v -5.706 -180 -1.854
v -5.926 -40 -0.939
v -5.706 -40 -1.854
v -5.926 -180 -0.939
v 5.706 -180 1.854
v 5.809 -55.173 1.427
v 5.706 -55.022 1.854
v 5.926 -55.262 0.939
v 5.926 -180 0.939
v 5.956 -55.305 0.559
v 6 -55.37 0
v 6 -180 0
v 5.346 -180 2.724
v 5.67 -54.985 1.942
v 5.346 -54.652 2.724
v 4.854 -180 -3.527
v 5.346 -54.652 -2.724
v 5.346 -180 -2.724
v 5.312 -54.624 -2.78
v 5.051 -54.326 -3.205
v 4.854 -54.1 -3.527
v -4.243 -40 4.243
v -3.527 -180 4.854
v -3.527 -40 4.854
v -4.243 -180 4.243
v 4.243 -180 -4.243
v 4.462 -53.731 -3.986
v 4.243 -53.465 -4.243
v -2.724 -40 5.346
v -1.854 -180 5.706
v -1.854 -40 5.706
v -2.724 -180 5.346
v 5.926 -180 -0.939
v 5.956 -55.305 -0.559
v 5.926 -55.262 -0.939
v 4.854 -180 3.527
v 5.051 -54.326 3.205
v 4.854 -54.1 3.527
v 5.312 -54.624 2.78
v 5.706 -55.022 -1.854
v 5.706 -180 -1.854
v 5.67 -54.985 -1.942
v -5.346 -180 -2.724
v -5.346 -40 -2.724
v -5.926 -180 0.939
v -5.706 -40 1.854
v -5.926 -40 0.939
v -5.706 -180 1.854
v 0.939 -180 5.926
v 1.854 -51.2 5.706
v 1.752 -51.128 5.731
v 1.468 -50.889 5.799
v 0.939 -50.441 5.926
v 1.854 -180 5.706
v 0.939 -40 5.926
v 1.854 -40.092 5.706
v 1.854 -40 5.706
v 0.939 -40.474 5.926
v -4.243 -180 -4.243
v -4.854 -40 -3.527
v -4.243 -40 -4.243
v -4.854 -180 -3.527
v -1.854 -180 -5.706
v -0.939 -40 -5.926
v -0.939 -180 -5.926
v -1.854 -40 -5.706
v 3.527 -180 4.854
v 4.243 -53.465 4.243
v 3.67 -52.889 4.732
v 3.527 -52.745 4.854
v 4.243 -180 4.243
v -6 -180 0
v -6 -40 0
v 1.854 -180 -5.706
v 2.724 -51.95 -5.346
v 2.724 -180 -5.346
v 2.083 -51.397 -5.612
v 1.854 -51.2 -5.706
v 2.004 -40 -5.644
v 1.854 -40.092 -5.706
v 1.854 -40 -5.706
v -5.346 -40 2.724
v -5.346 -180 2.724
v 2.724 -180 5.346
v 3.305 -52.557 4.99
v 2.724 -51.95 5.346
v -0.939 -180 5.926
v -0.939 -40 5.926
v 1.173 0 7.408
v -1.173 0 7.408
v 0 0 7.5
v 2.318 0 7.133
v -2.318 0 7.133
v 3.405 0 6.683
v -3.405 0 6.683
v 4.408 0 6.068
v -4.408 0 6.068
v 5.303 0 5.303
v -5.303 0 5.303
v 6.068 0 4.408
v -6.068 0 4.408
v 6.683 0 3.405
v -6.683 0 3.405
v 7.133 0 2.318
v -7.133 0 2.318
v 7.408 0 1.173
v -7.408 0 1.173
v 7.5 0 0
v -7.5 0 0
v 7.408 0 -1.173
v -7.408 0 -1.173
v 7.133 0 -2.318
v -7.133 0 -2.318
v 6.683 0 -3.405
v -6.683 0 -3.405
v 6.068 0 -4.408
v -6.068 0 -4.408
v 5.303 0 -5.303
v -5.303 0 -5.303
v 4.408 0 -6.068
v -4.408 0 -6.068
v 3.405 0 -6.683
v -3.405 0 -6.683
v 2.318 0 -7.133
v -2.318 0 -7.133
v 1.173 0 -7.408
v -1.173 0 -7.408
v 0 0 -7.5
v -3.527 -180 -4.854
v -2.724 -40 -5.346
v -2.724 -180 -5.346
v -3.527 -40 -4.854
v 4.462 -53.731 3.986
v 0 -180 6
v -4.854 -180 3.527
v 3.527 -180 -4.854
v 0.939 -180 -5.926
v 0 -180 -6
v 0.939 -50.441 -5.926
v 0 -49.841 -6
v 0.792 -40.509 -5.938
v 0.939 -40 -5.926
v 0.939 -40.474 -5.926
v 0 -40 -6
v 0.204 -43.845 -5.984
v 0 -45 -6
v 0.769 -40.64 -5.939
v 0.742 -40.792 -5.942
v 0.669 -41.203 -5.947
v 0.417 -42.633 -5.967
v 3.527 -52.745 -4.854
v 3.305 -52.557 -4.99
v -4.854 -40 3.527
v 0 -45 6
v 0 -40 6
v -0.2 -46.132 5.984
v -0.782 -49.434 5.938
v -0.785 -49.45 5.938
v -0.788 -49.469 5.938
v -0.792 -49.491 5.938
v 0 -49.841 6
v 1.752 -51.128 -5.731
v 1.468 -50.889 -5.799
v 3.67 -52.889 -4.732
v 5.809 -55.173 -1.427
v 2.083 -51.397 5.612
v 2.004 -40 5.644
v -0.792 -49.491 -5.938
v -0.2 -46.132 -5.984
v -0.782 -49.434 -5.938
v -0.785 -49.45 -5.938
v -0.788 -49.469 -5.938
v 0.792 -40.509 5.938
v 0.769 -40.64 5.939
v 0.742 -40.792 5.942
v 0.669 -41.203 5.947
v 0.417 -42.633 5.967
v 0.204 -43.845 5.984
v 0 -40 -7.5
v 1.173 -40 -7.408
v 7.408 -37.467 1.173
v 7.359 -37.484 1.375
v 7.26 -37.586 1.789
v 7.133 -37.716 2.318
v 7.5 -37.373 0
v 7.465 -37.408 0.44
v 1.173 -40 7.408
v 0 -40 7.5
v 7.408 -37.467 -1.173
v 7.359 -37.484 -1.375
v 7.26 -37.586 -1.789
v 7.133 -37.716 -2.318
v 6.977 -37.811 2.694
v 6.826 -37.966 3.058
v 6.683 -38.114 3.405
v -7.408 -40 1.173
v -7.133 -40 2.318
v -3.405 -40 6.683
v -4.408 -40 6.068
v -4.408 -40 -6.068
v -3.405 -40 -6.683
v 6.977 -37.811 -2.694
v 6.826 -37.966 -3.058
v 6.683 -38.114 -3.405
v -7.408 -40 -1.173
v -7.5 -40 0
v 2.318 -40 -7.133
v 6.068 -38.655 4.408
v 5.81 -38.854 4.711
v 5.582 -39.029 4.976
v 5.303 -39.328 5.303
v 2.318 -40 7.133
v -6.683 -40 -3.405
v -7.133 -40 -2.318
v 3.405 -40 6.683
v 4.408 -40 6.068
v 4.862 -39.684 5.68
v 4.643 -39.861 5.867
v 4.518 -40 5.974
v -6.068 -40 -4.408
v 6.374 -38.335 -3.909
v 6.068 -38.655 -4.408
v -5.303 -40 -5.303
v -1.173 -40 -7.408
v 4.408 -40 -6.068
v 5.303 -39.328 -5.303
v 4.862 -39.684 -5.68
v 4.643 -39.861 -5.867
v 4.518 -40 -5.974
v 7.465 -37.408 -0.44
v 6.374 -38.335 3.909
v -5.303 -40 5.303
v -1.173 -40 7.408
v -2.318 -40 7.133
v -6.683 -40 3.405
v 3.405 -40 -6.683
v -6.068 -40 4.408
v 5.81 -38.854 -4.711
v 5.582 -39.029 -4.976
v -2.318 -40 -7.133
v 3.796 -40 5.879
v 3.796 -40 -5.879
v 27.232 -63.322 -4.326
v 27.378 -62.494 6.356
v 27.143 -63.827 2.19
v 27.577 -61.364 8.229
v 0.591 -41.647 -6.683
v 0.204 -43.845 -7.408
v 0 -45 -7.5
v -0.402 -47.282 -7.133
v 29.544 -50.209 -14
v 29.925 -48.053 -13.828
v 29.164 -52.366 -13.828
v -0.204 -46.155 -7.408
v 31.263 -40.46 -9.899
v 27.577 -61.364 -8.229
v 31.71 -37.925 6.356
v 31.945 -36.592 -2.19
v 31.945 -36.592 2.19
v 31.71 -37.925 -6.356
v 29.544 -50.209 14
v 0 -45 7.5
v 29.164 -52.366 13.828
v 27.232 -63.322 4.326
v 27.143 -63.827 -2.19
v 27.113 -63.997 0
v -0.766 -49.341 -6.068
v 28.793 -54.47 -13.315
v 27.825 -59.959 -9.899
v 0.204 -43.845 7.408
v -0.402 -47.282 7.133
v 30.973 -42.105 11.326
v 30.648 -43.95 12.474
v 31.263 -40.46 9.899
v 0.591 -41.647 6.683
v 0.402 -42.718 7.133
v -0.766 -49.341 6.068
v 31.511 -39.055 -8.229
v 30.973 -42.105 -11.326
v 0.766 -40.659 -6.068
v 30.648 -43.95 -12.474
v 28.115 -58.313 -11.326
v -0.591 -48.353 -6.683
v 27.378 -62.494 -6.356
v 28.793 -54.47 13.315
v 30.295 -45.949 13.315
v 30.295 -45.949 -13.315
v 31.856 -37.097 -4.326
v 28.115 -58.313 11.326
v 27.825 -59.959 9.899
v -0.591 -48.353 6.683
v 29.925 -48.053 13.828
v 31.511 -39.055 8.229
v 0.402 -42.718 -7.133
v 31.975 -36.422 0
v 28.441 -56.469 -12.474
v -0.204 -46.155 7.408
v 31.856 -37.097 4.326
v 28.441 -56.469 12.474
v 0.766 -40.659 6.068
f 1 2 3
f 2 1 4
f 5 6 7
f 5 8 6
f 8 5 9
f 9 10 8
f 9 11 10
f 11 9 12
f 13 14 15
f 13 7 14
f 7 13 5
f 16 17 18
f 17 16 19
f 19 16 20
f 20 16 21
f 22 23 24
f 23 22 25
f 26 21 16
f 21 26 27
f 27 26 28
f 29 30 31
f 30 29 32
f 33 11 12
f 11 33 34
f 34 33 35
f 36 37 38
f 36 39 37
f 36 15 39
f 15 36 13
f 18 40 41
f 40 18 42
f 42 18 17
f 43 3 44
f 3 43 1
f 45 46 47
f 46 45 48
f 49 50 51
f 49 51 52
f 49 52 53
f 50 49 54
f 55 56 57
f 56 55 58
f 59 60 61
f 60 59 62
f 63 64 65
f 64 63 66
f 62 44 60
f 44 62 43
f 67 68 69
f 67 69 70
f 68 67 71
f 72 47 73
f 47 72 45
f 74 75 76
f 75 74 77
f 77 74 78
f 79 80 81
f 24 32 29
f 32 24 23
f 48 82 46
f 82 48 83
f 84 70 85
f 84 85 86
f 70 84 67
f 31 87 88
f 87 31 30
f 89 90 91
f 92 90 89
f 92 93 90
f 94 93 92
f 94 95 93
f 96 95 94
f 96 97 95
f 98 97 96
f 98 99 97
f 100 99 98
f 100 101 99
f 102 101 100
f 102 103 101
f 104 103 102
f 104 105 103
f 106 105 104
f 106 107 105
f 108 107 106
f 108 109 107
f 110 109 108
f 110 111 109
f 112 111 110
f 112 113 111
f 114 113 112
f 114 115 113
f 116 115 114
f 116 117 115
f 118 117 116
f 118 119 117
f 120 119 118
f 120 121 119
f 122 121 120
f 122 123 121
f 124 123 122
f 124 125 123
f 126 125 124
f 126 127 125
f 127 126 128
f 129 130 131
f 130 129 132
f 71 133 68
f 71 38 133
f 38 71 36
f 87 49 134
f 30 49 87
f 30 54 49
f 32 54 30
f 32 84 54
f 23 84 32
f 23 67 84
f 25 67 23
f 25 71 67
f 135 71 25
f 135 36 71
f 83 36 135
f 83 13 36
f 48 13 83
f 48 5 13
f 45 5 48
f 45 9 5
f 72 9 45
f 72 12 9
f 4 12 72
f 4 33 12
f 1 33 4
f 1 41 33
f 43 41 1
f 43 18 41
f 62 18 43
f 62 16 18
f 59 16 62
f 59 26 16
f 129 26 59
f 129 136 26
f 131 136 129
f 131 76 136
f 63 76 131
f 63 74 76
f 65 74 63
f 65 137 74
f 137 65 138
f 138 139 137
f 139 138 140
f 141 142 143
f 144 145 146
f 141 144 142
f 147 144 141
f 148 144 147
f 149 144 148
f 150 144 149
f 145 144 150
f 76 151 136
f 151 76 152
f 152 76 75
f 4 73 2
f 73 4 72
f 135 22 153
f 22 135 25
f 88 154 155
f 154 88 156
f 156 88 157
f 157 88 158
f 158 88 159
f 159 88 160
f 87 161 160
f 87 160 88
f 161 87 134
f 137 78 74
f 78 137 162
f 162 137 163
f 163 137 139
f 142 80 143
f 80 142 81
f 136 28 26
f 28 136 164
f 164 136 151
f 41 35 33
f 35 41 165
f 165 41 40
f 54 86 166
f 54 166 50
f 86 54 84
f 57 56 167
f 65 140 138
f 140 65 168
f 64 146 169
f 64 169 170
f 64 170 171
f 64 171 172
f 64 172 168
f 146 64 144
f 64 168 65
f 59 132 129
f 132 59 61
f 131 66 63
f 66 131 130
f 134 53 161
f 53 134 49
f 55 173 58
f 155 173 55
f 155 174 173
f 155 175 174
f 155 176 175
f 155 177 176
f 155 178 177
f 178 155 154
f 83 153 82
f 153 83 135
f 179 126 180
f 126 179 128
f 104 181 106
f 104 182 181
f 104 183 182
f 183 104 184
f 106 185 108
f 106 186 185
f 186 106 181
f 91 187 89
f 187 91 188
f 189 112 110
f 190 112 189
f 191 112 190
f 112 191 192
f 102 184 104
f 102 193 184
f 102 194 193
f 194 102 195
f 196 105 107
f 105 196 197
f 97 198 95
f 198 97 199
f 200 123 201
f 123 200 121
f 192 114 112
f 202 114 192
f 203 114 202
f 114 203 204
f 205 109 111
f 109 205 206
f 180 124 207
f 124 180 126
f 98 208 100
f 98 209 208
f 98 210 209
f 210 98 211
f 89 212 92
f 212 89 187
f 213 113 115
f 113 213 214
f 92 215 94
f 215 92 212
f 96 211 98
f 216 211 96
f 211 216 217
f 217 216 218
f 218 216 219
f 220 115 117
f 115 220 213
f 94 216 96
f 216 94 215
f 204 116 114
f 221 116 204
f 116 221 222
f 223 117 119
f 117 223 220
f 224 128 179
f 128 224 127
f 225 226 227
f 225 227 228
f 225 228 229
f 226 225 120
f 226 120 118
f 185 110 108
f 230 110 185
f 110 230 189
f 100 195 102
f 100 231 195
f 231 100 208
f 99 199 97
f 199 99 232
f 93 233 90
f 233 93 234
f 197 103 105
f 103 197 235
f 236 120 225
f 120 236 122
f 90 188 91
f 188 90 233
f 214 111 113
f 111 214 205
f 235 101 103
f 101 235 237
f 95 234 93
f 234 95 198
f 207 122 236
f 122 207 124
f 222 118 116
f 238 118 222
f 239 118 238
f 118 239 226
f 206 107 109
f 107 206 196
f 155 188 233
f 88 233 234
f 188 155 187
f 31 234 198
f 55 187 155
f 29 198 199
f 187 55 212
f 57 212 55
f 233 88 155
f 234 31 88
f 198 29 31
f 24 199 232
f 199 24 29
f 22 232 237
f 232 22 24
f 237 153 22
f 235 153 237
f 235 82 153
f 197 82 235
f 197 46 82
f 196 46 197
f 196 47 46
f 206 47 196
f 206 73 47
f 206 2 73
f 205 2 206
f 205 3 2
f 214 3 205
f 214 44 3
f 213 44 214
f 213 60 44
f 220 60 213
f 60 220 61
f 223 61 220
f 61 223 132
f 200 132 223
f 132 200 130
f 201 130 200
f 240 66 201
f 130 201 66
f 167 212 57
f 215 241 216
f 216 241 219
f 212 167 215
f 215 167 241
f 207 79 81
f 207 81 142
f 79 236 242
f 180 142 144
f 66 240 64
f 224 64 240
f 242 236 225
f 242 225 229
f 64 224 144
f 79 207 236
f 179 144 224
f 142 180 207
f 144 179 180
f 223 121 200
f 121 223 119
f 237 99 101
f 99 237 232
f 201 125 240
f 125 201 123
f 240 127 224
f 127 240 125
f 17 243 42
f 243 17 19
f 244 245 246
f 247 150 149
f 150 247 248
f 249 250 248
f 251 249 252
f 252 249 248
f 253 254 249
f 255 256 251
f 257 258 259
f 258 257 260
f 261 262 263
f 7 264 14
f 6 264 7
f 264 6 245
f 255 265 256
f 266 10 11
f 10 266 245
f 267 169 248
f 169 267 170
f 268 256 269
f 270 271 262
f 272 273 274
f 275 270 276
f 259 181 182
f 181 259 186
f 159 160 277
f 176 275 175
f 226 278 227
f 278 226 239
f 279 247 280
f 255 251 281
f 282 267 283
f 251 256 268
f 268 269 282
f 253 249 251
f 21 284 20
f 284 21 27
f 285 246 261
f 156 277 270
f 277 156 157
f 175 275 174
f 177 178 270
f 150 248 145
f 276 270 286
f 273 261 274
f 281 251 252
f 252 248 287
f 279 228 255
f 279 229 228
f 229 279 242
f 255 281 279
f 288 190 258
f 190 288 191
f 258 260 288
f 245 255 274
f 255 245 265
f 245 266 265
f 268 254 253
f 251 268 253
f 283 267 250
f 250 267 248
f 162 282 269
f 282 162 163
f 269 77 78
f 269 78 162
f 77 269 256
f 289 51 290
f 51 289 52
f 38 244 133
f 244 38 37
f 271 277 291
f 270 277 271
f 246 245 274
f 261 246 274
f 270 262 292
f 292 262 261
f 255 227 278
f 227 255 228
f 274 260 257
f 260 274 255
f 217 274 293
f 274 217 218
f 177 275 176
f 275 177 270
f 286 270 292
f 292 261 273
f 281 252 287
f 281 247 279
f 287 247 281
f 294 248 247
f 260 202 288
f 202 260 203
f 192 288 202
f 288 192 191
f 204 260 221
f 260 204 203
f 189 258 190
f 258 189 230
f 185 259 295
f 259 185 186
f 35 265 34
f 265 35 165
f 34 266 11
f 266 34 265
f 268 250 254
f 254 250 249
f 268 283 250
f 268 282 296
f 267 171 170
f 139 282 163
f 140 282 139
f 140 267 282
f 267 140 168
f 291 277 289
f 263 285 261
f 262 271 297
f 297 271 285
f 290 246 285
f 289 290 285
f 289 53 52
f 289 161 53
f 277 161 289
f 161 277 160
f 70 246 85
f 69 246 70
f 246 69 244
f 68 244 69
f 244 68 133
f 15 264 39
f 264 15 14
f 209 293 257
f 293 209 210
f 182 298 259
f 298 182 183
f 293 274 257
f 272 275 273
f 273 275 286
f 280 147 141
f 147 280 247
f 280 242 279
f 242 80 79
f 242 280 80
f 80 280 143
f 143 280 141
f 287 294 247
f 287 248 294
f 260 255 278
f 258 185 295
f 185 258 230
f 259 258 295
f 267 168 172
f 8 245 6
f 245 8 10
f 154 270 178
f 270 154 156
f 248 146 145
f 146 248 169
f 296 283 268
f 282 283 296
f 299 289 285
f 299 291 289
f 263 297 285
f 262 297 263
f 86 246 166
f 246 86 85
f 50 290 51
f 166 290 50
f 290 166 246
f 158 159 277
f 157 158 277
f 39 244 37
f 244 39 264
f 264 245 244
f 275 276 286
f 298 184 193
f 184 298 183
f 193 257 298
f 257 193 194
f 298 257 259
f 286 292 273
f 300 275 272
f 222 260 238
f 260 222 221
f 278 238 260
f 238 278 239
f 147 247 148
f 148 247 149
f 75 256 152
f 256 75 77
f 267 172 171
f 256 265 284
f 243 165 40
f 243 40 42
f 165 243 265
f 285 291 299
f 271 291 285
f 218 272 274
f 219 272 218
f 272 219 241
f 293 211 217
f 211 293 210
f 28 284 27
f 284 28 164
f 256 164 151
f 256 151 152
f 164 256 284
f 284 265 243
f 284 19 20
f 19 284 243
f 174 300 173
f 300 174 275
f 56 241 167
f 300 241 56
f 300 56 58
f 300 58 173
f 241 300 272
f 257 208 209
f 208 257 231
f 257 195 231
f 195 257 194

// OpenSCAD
$fn=40;

rotate([90,0,0]) cylinder(h=180,d=12);
rotate([90,0,0]) cylinder(h=40,d=15);
translate([0,-45,0]) rotate([0,0,-10]) rotate([0,90,0]) cylinder(h=30,d1=15,d2=28);
